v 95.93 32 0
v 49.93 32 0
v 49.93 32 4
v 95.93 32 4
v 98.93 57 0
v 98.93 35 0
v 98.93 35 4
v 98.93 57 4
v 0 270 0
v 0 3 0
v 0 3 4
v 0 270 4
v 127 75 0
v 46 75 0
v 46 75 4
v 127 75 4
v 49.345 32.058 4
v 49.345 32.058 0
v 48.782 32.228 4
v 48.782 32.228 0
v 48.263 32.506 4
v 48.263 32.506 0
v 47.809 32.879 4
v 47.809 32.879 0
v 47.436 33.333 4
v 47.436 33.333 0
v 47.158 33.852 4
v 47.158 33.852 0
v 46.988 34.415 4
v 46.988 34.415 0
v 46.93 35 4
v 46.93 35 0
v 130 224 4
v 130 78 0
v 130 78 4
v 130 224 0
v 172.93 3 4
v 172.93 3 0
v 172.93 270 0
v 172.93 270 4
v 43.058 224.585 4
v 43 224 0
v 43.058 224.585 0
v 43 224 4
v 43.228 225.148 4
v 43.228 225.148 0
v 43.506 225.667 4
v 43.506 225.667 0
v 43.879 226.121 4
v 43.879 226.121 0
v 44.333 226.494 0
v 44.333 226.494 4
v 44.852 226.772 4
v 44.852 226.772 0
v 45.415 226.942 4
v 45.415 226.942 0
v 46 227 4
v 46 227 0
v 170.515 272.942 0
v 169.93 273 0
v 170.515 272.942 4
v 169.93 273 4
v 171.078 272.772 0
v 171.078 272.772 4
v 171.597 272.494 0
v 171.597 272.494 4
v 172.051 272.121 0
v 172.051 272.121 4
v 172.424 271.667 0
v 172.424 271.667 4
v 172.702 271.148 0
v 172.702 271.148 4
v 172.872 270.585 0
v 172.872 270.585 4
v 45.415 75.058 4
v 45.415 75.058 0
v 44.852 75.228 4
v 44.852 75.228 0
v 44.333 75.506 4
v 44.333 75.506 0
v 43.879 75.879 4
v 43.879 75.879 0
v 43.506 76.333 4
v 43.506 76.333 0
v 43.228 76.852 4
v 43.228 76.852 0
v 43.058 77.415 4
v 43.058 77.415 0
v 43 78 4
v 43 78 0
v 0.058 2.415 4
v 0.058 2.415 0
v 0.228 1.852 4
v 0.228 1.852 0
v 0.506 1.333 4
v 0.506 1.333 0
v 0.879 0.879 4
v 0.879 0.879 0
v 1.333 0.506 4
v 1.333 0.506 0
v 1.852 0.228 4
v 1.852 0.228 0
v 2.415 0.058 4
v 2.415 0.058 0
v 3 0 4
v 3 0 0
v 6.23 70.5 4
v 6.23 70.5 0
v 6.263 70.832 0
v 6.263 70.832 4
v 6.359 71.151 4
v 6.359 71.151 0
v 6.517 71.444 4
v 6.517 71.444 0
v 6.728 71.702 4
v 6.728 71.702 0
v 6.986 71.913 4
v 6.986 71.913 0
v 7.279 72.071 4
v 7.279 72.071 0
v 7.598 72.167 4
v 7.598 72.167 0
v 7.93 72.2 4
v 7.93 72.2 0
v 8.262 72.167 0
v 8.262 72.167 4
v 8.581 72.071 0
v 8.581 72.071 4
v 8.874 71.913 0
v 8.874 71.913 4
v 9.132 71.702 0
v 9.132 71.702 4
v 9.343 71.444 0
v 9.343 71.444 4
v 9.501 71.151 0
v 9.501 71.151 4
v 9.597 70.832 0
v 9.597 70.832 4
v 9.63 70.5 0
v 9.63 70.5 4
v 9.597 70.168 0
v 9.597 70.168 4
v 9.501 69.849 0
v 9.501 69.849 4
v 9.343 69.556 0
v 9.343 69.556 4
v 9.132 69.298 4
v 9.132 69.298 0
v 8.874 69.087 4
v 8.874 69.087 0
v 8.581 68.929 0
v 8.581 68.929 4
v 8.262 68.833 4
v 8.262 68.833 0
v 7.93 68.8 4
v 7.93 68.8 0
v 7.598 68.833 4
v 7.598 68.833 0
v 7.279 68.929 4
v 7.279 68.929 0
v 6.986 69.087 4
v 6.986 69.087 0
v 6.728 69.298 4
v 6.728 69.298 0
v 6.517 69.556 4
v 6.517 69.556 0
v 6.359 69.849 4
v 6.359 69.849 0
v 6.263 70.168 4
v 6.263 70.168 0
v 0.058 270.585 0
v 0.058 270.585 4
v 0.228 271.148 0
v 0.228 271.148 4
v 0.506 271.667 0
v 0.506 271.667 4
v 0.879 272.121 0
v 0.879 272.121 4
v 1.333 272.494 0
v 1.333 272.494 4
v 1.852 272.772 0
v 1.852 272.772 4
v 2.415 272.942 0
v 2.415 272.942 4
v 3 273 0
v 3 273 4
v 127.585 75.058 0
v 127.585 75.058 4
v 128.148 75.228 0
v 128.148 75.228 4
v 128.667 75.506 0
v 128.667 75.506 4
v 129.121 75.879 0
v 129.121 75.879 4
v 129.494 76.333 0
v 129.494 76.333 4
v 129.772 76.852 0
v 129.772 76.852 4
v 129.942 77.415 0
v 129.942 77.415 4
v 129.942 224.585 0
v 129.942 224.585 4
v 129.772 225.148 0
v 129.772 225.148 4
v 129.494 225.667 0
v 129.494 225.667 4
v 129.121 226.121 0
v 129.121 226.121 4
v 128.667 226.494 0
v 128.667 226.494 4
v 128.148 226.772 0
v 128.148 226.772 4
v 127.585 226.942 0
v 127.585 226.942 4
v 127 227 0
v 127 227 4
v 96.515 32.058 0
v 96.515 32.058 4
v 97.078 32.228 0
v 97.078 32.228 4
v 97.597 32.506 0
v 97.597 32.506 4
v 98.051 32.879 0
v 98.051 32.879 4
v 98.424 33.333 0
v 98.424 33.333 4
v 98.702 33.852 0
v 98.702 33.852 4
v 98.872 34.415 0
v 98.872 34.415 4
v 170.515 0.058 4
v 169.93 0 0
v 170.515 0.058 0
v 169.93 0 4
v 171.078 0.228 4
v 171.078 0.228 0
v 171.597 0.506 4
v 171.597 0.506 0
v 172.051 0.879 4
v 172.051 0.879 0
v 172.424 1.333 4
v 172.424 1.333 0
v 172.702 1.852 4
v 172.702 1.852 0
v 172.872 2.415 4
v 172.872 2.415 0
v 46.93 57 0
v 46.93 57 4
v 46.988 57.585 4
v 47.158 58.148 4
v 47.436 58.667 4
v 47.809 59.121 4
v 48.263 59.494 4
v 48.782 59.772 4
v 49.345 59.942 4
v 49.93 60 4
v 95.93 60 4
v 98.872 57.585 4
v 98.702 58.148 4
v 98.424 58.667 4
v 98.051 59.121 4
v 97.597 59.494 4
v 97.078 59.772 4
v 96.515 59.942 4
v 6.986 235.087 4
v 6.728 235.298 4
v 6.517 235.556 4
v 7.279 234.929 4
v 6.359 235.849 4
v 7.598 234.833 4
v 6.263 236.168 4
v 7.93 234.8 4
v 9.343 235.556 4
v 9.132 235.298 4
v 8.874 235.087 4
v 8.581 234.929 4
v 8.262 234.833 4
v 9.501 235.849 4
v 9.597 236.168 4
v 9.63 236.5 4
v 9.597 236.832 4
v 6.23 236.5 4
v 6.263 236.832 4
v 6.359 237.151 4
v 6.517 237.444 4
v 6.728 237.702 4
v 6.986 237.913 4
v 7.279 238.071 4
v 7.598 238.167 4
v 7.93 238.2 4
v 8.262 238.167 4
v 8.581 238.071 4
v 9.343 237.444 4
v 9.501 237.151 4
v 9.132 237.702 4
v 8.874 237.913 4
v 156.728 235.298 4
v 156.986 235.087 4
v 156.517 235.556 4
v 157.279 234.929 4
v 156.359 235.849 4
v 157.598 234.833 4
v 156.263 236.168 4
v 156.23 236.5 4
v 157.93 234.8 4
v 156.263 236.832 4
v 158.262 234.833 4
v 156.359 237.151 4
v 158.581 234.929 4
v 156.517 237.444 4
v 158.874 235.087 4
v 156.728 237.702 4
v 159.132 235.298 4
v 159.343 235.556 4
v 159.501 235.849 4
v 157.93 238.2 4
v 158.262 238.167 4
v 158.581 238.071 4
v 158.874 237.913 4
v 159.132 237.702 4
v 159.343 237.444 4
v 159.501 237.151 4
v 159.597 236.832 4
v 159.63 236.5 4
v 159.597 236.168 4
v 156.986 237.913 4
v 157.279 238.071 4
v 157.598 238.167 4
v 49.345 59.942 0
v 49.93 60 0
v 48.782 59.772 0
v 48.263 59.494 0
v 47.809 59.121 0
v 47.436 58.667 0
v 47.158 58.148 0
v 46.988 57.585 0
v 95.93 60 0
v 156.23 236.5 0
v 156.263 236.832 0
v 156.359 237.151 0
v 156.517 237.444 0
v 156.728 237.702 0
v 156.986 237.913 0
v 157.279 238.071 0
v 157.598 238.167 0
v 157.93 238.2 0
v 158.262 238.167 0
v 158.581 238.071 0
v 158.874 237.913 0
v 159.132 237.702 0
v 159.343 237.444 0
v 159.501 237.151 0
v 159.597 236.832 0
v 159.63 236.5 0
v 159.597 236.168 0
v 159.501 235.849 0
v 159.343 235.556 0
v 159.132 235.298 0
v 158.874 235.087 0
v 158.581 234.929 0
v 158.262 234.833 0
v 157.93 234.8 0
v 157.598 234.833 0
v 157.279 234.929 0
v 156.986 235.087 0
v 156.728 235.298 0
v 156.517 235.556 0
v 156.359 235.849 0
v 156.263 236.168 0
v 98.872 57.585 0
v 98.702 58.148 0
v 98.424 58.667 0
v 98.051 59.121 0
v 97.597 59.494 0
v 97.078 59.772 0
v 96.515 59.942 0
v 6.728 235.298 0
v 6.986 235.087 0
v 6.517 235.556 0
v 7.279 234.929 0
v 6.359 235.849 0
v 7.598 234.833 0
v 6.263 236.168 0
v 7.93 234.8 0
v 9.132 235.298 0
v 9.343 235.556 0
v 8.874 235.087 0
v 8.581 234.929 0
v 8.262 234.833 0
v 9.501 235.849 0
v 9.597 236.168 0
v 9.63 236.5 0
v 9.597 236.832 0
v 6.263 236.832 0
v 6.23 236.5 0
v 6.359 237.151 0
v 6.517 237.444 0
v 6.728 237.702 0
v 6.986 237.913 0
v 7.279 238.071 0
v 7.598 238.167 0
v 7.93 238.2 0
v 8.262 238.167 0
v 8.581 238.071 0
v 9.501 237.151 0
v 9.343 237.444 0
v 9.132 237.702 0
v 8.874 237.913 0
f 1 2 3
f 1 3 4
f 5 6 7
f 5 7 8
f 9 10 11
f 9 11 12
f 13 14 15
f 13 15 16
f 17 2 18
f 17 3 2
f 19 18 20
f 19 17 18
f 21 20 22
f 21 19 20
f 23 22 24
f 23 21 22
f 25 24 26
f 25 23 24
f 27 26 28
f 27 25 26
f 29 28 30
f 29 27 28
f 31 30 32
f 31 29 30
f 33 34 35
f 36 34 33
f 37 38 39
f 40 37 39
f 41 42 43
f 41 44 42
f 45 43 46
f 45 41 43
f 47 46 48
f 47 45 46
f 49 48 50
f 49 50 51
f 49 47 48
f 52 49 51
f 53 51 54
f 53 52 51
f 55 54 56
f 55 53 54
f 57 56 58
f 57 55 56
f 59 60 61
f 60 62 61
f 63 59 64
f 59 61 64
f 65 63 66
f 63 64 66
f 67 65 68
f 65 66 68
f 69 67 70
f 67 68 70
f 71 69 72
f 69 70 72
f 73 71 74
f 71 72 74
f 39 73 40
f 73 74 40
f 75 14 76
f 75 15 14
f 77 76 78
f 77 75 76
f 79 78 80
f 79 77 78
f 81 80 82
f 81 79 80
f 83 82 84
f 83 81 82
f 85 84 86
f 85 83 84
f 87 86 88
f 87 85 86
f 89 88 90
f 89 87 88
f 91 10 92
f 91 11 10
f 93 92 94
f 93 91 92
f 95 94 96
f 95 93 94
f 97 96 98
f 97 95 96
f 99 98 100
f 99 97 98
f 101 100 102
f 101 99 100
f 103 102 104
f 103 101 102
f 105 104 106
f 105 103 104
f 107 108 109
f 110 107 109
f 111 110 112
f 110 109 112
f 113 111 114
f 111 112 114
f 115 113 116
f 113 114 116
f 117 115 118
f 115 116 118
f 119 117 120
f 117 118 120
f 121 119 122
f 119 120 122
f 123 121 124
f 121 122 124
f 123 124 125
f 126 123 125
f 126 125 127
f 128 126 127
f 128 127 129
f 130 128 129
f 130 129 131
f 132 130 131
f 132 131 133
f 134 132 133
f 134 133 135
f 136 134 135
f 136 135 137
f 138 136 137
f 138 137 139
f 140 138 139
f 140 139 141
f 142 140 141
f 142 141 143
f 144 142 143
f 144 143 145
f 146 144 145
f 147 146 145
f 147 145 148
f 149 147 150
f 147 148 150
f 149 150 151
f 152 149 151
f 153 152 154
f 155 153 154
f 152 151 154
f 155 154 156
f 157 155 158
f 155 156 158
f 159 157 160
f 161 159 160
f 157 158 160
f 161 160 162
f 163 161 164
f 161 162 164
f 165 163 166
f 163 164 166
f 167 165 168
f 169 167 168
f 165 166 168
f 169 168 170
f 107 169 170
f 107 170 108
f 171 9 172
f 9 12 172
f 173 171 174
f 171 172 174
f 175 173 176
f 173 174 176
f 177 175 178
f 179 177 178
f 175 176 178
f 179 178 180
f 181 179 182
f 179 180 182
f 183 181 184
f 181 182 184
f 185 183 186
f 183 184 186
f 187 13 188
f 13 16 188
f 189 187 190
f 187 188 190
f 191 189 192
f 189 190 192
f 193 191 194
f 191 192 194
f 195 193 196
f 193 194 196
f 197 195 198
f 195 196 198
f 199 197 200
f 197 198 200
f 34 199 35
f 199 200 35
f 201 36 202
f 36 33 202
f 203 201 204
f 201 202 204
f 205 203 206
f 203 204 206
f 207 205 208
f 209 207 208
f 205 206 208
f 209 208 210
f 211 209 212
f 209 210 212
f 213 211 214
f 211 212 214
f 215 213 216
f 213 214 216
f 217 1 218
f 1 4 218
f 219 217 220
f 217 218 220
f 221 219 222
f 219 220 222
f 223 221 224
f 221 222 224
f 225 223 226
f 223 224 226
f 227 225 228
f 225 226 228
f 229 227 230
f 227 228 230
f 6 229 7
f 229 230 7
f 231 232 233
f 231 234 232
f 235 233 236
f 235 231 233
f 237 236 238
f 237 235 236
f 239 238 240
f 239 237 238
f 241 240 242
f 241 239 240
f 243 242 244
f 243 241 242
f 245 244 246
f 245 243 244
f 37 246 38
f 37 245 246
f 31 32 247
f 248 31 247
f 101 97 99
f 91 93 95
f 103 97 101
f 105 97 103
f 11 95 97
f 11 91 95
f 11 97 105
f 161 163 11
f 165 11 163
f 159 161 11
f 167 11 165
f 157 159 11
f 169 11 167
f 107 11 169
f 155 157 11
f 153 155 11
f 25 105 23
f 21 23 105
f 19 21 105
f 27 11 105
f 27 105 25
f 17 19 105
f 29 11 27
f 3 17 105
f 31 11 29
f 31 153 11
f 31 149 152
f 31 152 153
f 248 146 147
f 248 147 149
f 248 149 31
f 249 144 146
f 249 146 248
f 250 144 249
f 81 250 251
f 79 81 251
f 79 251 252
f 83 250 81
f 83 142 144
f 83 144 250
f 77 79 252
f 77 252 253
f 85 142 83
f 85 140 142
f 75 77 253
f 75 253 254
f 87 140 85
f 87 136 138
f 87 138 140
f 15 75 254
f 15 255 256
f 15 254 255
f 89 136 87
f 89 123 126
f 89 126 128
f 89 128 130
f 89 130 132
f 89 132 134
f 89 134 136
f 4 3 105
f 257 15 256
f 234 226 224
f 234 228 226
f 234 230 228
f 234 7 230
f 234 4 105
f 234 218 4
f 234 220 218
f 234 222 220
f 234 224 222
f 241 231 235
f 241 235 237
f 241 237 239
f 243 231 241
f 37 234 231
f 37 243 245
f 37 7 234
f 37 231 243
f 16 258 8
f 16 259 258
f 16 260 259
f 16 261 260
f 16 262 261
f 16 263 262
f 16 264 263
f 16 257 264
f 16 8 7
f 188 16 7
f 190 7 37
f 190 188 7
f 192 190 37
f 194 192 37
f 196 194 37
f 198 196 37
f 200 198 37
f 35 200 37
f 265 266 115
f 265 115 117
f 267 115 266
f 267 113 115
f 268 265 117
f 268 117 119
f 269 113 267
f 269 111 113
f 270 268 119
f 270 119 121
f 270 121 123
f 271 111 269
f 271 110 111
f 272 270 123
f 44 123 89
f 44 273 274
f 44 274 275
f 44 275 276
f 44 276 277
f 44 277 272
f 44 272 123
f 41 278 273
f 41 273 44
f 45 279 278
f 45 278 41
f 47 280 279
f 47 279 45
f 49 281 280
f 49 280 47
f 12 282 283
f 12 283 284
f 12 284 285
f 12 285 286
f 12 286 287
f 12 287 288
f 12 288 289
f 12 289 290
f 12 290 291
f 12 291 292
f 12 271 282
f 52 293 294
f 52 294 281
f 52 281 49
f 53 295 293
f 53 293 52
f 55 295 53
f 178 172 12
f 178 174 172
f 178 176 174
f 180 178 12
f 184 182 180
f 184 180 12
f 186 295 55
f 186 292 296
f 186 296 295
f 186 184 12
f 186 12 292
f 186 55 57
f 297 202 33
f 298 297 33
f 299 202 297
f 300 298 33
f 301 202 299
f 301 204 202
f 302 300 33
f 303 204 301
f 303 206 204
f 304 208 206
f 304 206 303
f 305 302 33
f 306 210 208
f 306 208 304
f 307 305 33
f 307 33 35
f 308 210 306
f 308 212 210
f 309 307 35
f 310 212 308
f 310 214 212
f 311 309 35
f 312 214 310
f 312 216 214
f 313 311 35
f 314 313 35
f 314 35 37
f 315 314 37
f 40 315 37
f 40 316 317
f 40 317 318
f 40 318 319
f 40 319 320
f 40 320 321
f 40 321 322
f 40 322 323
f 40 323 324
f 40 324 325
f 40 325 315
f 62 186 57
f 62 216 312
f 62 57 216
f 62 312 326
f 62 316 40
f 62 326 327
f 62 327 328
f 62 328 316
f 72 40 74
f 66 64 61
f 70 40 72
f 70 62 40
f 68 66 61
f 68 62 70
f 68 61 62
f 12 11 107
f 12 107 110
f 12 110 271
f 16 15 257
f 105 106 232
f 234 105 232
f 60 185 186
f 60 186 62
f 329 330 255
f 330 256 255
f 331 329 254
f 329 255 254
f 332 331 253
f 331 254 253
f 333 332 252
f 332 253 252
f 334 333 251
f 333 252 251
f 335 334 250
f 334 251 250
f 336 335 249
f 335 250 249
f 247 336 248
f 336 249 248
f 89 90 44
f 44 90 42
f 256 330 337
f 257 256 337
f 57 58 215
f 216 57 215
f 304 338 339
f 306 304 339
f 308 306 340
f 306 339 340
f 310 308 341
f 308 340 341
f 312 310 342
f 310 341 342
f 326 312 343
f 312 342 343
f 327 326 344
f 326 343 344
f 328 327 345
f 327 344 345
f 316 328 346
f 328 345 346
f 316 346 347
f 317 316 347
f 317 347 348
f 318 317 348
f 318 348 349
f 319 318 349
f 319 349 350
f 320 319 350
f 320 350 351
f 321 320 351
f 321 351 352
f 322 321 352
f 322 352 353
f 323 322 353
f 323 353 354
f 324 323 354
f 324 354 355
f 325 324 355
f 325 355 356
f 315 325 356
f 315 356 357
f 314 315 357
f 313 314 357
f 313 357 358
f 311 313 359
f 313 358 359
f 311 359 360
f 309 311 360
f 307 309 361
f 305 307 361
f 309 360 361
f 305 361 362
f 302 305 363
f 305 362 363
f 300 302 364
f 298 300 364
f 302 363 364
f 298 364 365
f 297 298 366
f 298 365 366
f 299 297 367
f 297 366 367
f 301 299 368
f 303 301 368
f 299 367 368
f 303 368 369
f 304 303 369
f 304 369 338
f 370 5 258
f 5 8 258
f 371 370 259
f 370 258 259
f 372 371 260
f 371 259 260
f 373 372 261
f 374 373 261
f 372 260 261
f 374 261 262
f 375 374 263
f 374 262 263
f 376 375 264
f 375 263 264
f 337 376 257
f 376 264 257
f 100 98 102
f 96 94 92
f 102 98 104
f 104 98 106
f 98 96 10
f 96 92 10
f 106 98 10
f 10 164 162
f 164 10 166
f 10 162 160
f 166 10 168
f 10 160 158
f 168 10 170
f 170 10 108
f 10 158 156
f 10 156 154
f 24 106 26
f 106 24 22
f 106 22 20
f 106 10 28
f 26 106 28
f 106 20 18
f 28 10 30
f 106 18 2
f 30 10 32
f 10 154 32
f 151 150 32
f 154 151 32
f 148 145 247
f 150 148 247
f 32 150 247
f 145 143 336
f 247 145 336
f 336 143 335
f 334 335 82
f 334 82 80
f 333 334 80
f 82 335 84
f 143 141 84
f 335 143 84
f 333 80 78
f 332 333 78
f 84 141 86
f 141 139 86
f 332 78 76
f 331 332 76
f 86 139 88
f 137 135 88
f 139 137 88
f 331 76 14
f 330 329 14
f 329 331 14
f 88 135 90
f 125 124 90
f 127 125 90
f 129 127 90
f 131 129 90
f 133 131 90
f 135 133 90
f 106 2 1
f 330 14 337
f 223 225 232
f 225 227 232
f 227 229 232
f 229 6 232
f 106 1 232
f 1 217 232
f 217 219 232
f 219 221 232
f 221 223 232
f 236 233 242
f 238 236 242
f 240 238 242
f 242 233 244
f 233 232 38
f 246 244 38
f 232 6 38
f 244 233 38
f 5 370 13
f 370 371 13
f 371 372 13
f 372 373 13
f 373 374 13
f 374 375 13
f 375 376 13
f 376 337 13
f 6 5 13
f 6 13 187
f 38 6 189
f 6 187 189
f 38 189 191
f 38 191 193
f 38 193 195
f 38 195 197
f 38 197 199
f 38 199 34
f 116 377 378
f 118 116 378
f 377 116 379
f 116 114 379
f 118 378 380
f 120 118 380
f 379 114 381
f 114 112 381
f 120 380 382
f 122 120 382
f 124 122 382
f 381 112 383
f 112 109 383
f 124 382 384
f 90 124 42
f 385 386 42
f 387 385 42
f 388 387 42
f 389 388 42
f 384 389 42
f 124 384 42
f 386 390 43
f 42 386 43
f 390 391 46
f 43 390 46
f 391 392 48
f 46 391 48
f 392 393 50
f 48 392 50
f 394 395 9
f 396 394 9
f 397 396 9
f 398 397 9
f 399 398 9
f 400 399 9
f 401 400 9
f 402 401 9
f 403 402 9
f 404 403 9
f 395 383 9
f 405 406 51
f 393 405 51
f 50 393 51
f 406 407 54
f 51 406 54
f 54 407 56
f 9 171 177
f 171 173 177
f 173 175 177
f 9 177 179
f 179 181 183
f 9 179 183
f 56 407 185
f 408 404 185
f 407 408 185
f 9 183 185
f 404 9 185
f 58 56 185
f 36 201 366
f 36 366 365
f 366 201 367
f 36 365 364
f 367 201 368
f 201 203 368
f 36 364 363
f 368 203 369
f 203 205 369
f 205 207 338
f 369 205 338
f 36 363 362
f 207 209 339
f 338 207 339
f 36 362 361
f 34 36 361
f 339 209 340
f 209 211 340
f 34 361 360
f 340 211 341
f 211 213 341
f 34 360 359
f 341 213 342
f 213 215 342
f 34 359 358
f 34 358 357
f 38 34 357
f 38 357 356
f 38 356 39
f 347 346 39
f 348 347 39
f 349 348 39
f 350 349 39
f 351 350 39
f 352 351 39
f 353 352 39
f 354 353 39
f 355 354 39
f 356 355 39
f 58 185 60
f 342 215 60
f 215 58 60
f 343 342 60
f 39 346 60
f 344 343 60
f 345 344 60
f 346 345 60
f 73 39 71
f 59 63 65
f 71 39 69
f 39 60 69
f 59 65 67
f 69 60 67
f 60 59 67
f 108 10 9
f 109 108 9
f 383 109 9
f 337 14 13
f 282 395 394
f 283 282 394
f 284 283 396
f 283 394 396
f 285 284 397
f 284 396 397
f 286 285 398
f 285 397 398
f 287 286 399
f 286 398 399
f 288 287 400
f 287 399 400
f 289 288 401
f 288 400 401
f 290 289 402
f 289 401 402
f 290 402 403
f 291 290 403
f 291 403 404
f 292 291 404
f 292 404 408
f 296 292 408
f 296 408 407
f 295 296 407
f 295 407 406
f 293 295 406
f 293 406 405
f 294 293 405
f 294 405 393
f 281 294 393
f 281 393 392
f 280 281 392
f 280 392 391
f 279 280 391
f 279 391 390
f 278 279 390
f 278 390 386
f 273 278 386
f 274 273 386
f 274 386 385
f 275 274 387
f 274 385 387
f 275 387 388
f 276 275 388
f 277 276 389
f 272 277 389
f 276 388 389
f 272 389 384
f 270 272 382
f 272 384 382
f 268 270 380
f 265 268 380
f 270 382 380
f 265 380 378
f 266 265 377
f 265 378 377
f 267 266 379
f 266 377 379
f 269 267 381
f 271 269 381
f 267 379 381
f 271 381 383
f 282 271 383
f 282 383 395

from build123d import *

# Parameters (mm, degrees)
ESQUISSE1_W        = 172.93
ESQUISSE1_H        = 273
ESQUISSE1_R        = 1.5
ESQUISSE1_W_2      = 87
ESQUISSE1_H_2      = 152
ESQUISSE1_W_3      = 52
ESQUISSE1_H_3      = 28
BOSS_EXTRU_1_DEPTH = 4
CONG_1_R           = 3
D_GAGEMENT_M31_D   = 3.4


with BuildPart() as part:
    # Esquisse1 → Boss.-Extru.1 (new body)
    with BuildSketch(Plane.XY):
        with Locations((86.465, 136.5)):
            Rectangle(ESQUISSE1_W, ESQUISSE1_H)
        with Locations((7.93, 236.5)):
            Circle(ESQUISSE1_R, mode=Mode.SUBTRACT)
        with Locations((7.93, 70.5)):
            Circle(ESQUISSE1_R, mode=Mode.SUBTRACT)
        with Locations((157.93, 236.5)):
            Circle(ESQUISSE1_R, mode=Mode.SUBTRACT)
        with Locations((86.5, 151)):
            Rectangle(ESQUISSE1_W_2, ESQUISSE1_H_2, mode=Mode.SUBTRACT)
        with Locations((72.93, 46)):
            Rectangle(ESQUISSE1_W_3, ESQUISSE1_H_3, mode=Mode.SUBTRACT)
    extrude(amount=BOSS_EXTRU_1_DEPTH)

    # Congé1
    cong_1_edges = [part.edges().sort_by_distance(p)[0] for p in [
        (43, 227, 2),
        (43, 75, 2),
        (130, 75, 2),
        (130, 227, 2),
        (46.93, 60, 2),
        (46.93, 32, 2),
        (98.93, 32, 2),
        (98.93, 60, 2),
        (0, 273, 2),
        (172.93, 273, 2),
        (172.93, 0, 2),
        (0, 0, 2),
    ]]
    fillet(cong_1_edges, radius=CONG_1_R)

    # Dégagement M31 (through all)
    with Locations(Plane.XY.offset(4)):
        with Locations((7.93, 236.5), (7.93, 70.5), (157.93, 236.5)):
            Hole(D_GAGEMENT_M31_D / 2)


solid = part.part
